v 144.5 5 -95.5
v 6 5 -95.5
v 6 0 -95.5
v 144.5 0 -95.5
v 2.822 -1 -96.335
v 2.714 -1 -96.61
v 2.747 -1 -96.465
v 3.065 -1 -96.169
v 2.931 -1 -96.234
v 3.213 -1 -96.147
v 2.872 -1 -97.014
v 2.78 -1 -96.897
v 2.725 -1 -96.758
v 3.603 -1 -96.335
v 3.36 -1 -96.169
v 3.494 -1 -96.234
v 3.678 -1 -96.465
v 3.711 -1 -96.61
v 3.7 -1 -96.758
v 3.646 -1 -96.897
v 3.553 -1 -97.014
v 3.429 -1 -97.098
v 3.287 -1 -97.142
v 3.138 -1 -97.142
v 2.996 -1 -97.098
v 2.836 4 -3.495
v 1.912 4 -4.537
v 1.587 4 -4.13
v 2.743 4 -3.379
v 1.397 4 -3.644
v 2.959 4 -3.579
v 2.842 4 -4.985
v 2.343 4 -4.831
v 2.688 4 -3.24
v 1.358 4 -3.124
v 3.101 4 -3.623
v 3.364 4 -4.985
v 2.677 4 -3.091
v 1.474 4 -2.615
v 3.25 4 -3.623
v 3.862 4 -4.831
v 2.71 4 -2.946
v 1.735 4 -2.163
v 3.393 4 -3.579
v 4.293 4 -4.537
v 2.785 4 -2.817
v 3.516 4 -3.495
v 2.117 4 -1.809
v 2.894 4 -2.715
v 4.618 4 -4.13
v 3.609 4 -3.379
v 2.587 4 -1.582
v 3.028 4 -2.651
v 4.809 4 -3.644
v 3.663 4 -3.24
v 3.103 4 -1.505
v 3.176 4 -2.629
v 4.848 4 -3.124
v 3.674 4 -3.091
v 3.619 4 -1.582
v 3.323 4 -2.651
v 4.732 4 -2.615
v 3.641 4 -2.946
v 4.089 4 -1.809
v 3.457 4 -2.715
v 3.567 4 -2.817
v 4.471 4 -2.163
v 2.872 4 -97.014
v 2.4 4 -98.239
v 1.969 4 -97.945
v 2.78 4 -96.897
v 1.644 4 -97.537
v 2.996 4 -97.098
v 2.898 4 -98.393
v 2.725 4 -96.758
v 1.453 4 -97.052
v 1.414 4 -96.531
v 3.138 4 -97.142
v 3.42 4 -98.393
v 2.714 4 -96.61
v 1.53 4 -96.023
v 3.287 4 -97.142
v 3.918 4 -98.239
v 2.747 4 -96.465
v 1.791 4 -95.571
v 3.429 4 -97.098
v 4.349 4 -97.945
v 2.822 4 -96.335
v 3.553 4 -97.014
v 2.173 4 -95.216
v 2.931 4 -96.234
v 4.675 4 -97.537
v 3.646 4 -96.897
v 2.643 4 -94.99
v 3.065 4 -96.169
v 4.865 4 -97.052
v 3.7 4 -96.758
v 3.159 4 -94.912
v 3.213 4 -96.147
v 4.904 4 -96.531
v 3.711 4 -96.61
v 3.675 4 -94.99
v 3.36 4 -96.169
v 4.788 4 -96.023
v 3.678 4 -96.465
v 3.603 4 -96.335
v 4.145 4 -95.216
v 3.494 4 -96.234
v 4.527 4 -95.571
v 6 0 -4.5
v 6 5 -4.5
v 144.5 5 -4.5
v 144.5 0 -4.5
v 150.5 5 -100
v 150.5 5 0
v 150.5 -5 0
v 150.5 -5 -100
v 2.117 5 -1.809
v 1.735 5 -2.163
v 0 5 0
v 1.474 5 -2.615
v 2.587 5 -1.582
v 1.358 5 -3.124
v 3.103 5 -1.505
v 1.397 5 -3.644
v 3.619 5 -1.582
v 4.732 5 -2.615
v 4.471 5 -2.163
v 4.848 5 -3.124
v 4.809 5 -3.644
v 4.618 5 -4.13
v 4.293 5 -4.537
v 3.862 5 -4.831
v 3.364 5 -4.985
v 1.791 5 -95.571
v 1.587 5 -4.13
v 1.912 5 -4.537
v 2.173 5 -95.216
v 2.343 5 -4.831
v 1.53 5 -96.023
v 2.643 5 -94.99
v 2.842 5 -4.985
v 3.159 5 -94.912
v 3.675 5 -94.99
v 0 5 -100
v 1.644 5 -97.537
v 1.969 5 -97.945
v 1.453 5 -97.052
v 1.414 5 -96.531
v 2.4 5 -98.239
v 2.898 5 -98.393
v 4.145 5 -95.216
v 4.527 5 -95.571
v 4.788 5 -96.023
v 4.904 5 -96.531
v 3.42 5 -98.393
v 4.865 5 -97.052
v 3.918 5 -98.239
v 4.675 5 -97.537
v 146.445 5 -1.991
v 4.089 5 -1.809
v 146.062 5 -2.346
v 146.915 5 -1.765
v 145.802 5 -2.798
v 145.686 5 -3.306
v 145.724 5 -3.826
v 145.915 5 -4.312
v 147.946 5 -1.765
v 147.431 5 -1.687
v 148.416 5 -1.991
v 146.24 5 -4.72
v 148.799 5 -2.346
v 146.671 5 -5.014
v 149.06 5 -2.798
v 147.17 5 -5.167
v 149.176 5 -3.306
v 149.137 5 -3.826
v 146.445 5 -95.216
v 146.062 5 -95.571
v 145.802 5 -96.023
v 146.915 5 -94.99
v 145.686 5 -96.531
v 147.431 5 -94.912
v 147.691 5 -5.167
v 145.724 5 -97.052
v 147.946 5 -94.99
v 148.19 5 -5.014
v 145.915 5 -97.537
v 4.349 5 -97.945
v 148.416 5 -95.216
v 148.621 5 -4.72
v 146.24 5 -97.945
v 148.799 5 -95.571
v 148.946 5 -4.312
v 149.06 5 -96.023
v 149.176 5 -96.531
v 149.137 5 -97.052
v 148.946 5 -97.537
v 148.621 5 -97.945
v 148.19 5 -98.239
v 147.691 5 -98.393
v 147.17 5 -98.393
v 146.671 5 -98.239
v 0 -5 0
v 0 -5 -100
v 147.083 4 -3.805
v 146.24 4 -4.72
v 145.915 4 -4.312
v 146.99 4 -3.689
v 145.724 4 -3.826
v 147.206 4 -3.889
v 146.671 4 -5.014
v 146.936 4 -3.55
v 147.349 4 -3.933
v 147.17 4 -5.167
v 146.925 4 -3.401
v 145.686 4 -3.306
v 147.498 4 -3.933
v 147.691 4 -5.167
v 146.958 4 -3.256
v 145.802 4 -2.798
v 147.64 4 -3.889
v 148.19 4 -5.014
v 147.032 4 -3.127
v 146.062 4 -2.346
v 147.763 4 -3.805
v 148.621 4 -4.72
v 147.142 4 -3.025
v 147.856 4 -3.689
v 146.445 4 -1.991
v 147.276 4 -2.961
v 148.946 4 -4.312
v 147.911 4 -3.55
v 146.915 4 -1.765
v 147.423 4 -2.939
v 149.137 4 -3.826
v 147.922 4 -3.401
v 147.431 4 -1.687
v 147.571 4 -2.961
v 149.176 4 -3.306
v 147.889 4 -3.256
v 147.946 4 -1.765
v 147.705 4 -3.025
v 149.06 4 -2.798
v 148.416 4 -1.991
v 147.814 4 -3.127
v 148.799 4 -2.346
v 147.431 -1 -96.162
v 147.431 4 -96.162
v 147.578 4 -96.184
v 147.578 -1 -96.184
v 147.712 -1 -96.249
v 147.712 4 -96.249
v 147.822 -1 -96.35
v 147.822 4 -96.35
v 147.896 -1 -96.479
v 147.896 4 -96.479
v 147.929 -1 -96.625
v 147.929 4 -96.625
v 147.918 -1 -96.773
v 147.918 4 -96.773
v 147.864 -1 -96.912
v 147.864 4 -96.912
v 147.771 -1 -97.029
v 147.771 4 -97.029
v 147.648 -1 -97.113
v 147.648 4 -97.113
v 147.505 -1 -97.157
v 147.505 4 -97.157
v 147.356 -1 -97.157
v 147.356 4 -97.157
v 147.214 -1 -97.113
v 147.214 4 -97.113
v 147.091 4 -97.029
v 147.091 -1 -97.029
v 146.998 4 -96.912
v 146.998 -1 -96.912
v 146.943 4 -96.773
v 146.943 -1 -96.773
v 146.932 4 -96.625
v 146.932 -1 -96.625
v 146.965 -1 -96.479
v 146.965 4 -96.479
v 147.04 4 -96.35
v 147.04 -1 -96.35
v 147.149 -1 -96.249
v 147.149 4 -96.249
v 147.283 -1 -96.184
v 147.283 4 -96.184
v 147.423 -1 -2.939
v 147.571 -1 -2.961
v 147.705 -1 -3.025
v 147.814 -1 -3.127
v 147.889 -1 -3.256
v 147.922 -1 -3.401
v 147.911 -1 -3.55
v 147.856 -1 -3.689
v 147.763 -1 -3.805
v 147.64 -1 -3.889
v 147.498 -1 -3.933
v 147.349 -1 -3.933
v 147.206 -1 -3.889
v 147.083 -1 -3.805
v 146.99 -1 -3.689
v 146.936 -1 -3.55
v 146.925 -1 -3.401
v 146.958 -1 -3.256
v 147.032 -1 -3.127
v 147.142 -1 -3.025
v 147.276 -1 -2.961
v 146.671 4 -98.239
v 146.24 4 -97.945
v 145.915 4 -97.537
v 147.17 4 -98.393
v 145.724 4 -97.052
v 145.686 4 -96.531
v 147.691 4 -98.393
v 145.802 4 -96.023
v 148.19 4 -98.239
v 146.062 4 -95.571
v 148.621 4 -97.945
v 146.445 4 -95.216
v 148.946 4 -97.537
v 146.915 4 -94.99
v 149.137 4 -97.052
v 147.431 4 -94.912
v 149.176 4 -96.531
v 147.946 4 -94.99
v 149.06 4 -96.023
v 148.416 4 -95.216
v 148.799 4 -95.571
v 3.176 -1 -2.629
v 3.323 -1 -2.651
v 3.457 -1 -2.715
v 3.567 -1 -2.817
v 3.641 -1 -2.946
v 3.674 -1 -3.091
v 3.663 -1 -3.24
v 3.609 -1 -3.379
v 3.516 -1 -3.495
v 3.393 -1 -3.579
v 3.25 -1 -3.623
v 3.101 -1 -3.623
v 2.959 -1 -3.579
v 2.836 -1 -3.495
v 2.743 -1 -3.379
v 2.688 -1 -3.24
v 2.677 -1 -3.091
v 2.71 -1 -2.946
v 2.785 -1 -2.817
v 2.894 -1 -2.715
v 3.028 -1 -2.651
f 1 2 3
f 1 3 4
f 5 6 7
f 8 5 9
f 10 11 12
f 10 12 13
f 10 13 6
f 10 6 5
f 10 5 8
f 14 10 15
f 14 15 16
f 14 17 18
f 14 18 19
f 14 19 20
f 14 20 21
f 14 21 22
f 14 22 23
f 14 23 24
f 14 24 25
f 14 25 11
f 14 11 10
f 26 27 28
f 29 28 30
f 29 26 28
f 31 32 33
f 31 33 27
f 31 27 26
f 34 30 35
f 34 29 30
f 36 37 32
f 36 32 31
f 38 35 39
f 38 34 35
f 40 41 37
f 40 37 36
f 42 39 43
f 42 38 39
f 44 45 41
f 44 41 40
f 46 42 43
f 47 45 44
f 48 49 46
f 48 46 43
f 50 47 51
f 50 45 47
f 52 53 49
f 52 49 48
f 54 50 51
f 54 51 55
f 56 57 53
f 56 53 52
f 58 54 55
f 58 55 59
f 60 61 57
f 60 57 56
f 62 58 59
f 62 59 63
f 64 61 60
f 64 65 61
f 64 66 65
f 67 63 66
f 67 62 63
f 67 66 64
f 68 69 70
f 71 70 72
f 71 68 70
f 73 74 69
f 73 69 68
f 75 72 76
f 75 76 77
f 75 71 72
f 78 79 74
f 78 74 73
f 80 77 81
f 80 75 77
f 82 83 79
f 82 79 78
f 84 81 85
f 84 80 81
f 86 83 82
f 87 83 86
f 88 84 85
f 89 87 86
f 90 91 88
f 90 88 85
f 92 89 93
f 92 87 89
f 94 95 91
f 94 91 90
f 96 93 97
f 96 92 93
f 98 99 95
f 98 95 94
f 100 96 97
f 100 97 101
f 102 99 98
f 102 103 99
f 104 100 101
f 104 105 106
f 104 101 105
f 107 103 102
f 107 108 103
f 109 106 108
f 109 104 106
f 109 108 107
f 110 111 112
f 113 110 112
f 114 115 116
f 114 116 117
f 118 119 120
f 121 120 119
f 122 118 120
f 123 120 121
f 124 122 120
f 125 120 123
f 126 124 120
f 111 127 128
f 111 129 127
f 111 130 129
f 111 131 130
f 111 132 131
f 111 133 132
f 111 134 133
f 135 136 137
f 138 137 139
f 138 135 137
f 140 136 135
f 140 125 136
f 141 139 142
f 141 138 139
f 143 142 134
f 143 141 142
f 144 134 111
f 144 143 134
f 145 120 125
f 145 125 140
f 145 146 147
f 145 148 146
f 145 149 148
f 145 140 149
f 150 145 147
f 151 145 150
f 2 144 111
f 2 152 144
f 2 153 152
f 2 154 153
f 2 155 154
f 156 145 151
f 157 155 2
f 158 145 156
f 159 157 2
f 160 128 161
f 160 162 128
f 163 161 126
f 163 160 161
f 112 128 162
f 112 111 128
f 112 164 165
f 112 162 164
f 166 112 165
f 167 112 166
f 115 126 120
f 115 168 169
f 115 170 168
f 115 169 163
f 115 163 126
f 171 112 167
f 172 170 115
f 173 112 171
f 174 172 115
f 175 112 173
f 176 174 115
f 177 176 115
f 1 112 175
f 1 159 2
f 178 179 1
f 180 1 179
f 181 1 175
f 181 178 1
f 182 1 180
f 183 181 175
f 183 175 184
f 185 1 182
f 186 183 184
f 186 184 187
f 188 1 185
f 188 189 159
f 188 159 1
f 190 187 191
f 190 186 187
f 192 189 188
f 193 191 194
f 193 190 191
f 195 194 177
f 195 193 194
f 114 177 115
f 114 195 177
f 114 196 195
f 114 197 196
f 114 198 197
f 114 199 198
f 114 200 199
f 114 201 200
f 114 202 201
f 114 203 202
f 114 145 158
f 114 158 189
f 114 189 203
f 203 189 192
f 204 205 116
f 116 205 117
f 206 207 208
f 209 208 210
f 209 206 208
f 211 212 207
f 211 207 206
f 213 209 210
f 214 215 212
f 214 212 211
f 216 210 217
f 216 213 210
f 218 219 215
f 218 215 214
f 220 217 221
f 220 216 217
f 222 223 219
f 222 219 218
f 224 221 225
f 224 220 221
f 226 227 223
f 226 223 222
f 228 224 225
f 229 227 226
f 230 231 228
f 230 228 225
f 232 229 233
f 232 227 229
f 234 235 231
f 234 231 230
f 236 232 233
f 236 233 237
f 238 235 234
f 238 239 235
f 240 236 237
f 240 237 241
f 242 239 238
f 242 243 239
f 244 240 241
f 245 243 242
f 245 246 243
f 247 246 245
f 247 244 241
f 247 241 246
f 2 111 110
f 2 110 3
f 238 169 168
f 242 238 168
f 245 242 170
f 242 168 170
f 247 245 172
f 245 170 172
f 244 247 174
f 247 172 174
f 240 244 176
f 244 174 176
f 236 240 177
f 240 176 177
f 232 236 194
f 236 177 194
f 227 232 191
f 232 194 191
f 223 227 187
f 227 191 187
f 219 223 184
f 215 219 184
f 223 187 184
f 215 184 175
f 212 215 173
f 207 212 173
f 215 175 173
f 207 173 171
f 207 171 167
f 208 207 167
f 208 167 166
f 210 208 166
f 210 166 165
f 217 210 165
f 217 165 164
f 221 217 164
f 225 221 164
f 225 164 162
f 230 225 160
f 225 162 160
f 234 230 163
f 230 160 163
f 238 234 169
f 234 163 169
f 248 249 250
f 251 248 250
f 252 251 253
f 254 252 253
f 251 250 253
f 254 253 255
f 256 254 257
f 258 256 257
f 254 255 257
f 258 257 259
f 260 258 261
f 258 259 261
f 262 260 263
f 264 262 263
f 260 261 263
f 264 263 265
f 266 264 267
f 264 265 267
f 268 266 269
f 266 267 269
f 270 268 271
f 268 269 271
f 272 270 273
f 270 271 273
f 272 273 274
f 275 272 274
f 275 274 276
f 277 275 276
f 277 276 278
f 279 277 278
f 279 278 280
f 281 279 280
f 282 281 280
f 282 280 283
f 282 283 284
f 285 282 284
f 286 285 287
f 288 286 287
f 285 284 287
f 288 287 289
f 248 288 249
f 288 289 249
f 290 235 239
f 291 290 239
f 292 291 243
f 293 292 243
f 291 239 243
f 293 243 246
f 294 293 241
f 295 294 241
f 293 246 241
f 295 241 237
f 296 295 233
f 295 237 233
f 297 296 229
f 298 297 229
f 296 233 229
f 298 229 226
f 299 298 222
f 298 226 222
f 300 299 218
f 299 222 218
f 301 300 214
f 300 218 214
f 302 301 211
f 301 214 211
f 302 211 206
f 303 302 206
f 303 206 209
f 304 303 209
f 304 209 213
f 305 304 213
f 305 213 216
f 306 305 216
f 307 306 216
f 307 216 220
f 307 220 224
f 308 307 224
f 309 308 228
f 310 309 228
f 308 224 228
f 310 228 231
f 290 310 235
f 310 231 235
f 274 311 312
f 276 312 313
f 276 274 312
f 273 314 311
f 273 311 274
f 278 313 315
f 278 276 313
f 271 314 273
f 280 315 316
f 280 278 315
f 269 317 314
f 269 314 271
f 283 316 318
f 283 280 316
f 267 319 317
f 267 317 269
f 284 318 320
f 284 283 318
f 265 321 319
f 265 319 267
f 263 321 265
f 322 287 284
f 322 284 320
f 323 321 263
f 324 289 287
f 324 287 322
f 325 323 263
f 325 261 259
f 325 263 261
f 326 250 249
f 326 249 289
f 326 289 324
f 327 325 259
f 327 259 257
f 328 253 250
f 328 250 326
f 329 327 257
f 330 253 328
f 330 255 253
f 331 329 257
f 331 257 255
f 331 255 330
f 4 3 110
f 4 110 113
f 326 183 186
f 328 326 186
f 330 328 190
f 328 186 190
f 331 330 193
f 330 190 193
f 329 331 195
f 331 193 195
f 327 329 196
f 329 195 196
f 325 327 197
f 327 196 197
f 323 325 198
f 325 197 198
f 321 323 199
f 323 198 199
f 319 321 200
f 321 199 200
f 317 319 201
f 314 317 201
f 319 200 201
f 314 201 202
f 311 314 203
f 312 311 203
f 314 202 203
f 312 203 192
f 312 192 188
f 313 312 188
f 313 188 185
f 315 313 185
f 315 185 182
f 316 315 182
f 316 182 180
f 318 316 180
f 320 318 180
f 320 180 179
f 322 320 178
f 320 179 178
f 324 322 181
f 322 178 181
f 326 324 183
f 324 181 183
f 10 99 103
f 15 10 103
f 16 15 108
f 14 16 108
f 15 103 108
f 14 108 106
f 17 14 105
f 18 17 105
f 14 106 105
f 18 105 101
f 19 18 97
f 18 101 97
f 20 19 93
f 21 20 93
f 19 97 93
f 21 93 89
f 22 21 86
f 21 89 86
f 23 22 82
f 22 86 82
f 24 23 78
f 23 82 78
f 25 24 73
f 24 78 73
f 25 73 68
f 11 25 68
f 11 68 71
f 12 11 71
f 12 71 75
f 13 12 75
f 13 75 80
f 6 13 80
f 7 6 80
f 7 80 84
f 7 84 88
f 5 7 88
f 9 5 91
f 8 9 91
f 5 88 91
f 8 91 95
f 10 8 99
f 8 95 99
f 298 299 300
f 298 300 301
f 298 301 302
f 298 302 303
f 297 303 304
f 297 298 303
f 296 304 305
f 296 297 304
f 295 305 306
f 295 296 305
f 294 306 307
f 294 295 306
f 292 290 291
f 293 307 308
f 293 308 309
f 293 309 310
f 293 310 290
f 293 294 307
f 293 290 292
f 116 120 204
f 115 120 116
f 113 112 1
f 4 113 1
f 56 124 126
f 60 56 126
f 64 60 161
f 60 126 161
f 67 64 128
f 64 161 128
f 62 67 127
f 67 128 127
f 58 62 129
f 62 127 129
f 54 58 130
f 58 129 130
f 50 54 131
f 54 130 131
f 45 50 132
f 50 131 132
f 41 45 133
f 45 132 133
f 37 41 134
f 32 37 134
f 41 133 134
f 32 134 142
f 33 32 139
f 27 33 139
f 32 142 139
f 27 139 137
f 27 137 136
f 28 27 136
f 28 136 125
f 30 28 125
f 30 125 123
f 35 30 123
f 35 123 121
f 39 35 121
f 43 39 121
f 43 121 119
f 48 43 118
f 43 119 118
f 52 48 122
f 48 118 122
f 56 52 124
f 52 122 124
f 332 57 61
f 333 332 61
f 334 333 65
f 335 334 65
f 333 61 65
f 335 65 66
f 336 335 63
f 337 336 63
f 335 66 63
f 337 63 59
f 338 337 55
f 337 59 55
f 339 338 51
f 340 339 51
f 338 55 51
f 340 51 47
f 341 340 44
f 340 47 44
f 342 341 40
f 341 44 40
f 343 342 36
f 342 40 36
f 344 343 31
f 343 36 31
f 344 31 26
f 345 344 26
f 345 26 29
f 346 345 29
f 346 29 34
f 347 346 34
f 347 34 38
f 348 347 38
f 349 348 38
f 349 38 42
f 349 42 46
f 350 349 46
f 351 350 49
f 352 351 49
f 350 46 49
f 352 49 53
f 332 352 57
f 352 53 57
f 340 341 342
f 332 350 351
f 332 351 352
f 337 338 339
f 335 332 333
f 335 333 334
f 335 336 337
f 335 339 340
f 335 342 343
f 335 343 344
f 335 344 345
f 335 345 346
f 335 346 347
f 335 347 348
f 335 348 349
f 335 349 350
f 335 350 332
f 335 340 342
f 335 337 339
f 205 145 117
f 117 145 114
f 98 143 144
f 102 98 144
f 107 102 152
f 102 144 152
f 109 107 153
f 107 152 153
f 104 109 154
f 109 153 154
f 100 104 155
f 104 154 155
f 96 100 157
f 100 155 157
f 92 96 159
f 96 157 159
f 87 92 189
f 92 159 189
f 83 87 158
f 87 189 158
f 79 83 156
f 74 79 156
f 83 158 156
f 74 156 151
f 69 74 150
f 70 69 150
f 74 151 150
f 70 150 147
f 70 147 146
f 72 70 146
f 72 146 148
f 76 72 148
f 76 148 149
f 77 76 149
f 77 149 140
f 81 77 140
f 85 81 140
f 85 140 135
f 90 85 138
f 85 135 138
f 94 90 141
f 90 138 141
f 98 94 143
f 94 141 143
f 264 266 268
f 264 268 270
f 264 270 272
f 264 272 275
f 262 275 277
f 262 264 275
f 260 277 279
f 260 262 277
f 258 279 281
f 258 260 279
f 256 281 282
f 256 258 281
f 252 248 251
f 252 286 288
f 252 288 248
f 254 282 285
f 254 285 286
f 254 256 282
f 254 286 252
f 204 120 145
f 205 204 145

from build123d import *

# Parameters (mm, degrees)
SKETCH1_W           = 150.5
SKETCH1_H           = 100
BOSS_EXTRUDE1_DEPTH = 5
SKETCH2_W           = 138.5
SKETCH2_H           = 91
CUT_EXTRUDE1_DEPTH  = 5
SKETCH3_R           = 1.75
CUT_EXTRUDE2_DEPTH  = 1
SKETCH4_R           = 0.5
CUT_EXTRUDE3_DEPTH  = 5


with BuildPart() as part:
    # Sketch1 → Boss-Extrude1 (new, symmetric)
    with BuildSketch(Plane(origin=(0, 0, 0), x_dir=(1, 0, 0), z_dir=(0, 1, 0))):
        with Locations((75.25, 50)):
            Rectangle(SKETCH1_W, SKETCH1_H)
    extrude(amount=BOSS_EXTRUDE1_DEPTH, both=True)

    # Sketch2 → Cut-Extrude1 (cut)
    with BuildSketch(Plane(origin=(0, 5, 0), x_dir=(1, 0, 0), z_dir=(0, 1, 0))):
        with Locations((75.25, 50)):
            Rectangle(SKETCH2_W, SKETCH2_H)
    extrude(amount=-CUT_EXTRUDE1_DEPTH, mode=Mode.SUBTRACT)

    # Sketch3 → Cut-Extrude2 (cut)
    with BuildSketch(Plane(origin=(0, 5, 0), x_dir=(1, 0, 0), z_dir=(0, 1, 0))):
        with Locations(Location((3.159079735, 96.662135708, 0), (0, 0, 270))):
            Circle(SKETCH3_R)
        with Locations(Location((3.102788334, 3.254527641, 0), (0, 0, 270))):
            Circle(SKETCH3_R)
        with Locations(Location((147.430623058, 3.436900869, 0), (0, 0, 270))):
            Circle(SKETCH3_R)
        with Locations(Location((147.430623058, 96.662135708, 0), (0, 0, 270))):
            Circle(SKETCH3_R)
    extrude(amount=-CUT_EXTRUDE2_DEPTH, mode=Mode.SUBTRACT)

    # Sketch4 → Cut-Extrude3 (cut)
    with BuildSketch(Plane(origin=(0, 4, 0), x_dir=(1, 0, 0), z_dir=(0, 1, 0))):
        with Locations(Location((3.212524906, 96.64723106, 0), (0, 0, 270))):
            Circle(SKETCH4_R)
        with Locations(Location((3.17577296, 3.128534438, 0), (0, 0, 270))):
            Circle(SKETCH4_R)
        with Locations(Location((147.423404744, 3.438562915, 0), (0, 0, 270))):
            Circle(SKETCH4_R)
        with Locations(Location((147.430623058, 96.662135708, 0), (0, 0, 270))):
            Circle(SKETCH4_R)
    extrude(amount=-CUT_EXTRUDE3_DEPTH, mode=Mode.SUBTRACT)


solid = part.part
